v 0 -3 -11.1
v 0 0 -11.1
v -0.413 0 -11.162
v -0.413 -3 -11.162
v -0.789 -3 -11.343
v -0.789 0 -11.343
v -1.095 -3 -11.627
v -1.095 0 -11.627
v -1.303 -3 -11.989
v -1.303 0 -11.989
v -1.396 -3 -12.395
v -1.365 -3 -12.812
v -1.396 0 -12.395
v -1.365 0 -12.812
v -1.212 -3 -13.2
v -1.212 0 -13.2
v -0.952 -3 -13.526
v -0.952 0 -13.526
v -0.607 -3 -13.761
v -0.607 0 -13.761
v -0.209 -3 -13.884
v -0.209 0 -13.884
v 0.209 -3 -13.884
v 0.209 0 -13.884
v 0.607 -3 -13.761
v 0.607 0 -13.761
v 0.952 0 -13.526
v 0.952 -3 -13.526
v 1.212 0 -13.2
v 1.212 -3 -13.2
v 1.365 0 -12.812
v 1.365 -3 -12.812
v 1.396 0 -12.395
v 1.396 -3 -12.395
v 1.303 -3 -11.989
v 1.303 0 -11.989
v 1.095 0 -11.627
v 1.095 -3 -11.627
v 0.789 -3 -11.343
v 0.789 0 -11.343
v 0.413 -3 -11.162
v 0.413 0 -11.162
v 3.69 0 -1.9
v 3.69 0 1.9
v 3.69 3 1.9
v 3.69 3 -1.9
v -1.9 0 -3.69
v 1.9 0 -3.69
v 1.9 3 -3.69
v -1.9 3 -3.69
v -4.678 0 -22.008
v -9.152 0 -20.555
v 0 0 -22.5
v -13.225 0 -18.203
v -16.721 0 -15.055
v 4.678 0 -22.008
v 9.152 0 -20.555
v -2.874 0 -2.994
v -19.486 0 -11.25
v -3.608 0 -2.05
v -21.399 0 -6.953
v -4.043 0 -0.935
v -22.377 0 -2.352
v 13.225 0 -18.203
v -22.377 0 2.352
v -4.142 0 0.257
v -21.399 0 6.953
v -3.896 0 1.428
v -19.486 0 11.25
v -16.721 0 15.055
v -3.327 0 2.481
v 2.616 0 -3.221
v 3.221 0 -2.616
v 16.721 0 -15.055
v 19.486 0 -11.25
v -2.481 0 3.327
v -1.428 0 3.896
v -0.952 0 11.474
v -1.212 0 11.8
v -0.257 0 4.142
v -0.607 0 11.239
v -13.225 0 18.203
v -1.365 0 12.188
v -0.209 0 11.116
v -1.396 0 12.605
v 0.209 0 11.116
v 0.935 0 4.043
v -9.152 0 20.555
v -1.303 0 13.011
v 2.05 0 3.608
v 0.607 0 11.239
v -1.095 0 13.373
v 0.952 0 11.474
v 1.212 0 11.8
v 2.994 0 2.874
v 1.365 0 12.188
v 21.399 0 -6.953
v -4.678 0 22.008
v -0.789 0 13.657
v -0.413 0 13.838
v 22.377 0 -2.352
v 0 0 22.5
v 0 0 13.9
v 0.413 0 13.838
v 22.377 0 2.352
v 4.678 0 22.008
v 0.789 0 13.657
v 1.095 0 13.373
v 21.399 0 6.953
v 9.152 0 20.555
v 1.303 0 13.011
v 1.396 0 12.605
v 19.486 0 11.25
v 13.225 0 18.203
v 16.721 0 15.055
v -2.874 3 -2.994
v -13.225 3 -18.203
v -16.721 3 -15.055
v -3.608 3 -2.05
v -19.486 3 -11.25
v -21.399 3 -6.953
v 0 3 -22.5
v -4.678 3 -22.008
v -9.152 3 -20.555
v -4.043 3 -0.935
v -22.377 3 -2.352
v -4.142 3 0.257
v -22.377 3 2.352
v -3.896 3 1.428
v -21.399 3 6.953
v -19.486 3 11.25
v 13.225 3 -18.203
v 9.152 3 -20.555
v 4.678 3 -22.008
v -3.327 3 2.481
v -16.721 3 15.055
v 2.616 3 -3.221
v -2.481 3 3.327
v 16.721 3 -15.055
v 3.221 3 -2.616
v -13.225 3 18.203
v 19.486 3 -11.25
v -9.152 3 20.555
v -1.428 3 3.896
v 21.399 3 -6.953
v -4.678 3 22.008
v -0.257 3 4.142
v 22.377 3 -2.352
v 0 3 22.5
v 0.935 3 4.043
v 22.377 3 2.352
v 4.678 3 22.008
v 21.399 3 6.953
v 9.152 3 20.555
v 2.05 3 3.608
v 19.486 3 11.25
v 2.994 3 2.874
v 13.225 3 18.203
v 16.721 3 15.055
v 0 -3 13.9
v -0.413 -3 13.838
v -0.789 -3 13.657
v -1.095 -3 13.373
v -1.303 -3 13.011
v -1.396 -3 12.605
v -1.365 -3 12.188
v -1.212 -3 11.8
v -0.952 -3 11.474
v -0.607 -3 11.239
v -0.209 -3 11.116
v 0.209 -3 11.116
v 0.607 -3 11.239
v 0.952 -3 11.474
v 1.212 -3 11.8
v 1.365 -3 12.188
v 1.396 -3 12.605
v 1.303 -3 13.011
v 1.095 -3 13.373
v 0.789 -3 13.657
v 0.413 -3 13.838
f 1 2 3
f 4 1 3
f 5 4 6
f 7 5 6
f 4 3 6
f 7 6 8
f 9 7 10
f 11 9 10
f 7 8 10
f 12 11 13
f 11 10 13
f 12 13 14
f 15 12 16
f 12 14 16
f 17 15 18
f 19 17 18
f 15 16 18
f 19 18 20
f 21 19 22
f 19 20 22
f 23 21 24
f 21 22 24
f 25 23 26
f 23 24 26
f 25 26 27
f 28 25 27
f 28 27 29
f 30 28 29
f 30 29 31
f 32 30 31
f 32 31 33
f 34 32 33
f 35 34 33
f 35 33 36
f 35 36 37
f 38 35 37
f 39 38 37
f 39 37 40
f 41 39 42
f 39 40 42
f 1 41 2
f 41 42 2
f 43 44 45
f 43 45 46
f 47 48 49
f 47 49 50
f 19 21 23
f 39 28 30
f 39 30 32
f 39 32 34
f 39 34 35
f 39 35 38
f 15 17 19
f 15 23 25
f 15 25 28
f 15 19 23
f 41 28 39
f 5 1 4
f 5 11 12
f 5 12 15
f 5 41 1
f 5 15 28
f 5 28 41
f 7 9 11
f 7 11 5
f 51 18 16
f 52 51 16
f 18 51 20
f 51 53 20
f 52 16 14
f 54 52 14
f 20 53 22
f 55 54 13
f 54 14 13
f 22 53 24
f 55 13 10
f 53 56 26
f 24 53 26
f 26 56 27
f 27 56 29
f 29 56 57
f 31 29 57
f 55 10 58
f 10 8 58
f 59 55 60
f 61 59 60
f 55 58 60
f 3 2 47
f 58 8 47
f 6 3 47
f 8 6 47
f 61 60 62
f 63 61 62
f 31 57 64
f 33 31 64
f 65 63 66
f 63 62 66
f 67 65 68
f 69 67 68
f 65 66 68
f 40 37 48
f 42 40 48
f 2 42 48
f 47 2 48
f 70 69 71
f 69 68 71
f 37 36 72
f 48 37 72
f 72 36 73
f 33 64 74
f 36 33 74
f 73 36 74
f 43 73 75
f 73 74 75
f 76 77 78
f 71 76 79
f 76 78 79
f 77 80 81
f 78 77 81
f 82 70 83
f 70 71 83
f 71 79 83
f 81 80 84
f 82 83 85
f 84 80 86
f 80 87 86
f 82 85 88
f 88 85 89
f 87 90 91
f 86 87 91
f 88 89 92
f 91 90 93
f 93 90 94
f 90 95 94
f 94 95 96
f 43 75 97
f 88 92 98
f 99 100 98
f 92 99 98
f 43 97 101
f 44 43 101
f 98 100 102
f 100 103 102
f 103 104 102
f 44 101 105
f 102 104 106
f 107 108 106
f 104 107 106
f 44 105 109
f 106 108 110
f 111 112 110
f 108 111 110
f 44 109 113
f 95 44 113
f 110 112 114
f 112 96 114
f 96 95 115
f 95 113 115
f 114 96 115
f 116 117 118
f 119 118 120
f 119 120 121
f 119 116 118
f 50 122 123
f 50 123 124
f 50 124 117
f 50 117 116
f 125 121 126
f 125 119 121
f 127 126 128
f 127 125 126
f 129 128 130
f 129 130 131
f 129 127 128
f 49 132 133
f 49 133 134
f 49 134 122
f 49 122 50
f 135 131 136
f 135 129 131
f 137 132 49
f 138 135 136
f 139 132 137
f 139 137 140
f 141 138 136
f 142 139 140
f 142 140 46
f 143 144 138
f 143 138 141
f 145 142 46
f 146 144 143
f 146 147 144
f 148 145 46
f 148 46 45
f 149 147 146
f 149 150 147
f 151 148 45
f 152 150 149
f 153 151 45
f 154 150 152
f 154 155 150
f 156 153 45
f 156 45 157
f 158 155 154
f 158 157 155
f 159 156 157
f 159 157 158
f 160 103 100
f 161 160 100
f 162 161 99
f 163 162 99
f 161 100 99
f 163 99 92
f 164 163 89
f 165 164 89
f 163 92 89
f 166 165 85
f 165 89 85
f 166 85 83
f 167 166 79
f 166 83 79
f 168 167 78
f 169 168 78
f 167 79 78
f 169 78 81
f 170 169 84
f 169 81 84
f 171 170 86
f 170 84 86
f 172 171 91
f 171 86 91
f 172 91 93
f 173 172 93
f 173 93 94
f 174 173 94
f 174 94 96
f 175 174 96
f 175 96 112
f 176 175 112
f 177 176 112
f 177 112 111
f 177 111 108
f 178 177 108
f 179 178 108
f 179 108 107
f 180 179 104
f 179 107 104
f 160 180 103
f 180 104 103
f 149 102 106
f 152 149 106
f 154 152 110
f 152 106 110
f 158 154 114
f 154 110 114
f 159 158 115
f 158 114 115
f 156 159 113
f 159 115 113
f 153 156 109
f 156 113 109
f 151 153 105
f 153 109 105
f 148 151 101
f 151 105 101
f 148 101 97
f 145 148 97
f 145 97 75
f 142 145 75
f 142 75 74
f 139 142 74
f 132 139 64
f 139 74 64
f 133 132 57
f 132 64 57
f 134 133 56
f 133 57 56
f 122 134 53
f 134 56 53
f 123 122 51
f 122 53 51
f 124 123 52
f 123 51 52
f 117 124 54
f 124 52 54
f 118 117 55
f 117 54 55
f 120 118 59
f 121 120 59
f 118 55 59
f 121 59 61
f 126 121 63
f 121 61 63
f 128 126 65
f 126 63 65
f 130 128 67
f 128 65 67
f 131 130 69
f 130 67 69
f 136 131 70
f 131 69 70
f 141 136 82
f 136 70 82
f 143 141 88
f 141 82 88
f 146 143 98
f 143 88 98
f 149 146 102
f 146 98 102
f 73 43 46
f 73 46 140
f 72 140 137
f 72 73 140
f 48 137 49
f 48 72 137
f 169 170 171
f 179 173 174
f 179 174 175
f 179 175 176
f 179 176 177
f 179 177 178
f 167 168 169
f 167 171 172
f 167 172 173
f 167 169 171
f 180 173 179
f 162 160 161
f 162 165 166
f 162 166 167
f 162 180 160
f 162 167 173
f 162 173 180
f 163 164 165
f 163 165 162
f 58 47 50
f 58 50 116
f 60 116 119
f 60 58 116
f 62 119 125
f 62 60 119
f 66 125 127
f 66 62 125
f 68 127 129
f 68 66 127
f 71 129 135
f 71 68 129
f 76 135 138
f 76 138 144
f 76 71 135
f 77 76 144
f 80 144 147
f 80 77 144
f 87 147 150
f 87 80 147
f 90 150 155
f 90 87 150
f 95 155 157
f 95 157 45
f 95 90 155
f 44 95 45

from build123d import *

# Parameters (mm, degrees)
SKETCH_1_R      = 22.5
EXTRUDE_1_DEPTH = 3
SKETCH_2_R      = 1.4
EXTRUDE_2_DEPTH = 3


with BuildPart() as part:
    # Эскиз1 → Вытянуть1 (new body)
    with BuildSketch(Plane(origin=(0, 0, 0), x_dir=(1, 0, 0), z_dir=(0, 1, 0))):
        with Locations(Location((0, 0, 0), (0, 0, 270))):
            Circle(SKETCH_1_R)
        with BuildLine():
            Line((1.9, 3.689512163), (-1.9, 3.689512163))
            ThreePointArc((-1.9, 3.689512163), (-2.934493142, -2.934493142), (3.689512163, -1.9))
            Line((3.689512163, -1.9), (3.689512163, 1.9))
            ThreePointArc((3.689512163, 1.9), (2.934493142, 2.934493142), (1.9, 3.689512163))
        make_face(mode=Mode.SUBTRACT)
    extrude(amount=EXTRUDE_1_DEPTH)

    # Эскиз2 → Вытянуть2 (add)
    with BuildSketch(Plane.XZ):
        with Locations(Location((0, 12.5, 0), (0, 0, 90))):
            Circle(SKETCH_2_R)
        with Locations(Location((0, -12.5, 0), (0, 0, 90))):
            Circle(SKETCH_2_R)
    extrude(amount=EXTRUDE_2_DEPTH)


solid = part.part
